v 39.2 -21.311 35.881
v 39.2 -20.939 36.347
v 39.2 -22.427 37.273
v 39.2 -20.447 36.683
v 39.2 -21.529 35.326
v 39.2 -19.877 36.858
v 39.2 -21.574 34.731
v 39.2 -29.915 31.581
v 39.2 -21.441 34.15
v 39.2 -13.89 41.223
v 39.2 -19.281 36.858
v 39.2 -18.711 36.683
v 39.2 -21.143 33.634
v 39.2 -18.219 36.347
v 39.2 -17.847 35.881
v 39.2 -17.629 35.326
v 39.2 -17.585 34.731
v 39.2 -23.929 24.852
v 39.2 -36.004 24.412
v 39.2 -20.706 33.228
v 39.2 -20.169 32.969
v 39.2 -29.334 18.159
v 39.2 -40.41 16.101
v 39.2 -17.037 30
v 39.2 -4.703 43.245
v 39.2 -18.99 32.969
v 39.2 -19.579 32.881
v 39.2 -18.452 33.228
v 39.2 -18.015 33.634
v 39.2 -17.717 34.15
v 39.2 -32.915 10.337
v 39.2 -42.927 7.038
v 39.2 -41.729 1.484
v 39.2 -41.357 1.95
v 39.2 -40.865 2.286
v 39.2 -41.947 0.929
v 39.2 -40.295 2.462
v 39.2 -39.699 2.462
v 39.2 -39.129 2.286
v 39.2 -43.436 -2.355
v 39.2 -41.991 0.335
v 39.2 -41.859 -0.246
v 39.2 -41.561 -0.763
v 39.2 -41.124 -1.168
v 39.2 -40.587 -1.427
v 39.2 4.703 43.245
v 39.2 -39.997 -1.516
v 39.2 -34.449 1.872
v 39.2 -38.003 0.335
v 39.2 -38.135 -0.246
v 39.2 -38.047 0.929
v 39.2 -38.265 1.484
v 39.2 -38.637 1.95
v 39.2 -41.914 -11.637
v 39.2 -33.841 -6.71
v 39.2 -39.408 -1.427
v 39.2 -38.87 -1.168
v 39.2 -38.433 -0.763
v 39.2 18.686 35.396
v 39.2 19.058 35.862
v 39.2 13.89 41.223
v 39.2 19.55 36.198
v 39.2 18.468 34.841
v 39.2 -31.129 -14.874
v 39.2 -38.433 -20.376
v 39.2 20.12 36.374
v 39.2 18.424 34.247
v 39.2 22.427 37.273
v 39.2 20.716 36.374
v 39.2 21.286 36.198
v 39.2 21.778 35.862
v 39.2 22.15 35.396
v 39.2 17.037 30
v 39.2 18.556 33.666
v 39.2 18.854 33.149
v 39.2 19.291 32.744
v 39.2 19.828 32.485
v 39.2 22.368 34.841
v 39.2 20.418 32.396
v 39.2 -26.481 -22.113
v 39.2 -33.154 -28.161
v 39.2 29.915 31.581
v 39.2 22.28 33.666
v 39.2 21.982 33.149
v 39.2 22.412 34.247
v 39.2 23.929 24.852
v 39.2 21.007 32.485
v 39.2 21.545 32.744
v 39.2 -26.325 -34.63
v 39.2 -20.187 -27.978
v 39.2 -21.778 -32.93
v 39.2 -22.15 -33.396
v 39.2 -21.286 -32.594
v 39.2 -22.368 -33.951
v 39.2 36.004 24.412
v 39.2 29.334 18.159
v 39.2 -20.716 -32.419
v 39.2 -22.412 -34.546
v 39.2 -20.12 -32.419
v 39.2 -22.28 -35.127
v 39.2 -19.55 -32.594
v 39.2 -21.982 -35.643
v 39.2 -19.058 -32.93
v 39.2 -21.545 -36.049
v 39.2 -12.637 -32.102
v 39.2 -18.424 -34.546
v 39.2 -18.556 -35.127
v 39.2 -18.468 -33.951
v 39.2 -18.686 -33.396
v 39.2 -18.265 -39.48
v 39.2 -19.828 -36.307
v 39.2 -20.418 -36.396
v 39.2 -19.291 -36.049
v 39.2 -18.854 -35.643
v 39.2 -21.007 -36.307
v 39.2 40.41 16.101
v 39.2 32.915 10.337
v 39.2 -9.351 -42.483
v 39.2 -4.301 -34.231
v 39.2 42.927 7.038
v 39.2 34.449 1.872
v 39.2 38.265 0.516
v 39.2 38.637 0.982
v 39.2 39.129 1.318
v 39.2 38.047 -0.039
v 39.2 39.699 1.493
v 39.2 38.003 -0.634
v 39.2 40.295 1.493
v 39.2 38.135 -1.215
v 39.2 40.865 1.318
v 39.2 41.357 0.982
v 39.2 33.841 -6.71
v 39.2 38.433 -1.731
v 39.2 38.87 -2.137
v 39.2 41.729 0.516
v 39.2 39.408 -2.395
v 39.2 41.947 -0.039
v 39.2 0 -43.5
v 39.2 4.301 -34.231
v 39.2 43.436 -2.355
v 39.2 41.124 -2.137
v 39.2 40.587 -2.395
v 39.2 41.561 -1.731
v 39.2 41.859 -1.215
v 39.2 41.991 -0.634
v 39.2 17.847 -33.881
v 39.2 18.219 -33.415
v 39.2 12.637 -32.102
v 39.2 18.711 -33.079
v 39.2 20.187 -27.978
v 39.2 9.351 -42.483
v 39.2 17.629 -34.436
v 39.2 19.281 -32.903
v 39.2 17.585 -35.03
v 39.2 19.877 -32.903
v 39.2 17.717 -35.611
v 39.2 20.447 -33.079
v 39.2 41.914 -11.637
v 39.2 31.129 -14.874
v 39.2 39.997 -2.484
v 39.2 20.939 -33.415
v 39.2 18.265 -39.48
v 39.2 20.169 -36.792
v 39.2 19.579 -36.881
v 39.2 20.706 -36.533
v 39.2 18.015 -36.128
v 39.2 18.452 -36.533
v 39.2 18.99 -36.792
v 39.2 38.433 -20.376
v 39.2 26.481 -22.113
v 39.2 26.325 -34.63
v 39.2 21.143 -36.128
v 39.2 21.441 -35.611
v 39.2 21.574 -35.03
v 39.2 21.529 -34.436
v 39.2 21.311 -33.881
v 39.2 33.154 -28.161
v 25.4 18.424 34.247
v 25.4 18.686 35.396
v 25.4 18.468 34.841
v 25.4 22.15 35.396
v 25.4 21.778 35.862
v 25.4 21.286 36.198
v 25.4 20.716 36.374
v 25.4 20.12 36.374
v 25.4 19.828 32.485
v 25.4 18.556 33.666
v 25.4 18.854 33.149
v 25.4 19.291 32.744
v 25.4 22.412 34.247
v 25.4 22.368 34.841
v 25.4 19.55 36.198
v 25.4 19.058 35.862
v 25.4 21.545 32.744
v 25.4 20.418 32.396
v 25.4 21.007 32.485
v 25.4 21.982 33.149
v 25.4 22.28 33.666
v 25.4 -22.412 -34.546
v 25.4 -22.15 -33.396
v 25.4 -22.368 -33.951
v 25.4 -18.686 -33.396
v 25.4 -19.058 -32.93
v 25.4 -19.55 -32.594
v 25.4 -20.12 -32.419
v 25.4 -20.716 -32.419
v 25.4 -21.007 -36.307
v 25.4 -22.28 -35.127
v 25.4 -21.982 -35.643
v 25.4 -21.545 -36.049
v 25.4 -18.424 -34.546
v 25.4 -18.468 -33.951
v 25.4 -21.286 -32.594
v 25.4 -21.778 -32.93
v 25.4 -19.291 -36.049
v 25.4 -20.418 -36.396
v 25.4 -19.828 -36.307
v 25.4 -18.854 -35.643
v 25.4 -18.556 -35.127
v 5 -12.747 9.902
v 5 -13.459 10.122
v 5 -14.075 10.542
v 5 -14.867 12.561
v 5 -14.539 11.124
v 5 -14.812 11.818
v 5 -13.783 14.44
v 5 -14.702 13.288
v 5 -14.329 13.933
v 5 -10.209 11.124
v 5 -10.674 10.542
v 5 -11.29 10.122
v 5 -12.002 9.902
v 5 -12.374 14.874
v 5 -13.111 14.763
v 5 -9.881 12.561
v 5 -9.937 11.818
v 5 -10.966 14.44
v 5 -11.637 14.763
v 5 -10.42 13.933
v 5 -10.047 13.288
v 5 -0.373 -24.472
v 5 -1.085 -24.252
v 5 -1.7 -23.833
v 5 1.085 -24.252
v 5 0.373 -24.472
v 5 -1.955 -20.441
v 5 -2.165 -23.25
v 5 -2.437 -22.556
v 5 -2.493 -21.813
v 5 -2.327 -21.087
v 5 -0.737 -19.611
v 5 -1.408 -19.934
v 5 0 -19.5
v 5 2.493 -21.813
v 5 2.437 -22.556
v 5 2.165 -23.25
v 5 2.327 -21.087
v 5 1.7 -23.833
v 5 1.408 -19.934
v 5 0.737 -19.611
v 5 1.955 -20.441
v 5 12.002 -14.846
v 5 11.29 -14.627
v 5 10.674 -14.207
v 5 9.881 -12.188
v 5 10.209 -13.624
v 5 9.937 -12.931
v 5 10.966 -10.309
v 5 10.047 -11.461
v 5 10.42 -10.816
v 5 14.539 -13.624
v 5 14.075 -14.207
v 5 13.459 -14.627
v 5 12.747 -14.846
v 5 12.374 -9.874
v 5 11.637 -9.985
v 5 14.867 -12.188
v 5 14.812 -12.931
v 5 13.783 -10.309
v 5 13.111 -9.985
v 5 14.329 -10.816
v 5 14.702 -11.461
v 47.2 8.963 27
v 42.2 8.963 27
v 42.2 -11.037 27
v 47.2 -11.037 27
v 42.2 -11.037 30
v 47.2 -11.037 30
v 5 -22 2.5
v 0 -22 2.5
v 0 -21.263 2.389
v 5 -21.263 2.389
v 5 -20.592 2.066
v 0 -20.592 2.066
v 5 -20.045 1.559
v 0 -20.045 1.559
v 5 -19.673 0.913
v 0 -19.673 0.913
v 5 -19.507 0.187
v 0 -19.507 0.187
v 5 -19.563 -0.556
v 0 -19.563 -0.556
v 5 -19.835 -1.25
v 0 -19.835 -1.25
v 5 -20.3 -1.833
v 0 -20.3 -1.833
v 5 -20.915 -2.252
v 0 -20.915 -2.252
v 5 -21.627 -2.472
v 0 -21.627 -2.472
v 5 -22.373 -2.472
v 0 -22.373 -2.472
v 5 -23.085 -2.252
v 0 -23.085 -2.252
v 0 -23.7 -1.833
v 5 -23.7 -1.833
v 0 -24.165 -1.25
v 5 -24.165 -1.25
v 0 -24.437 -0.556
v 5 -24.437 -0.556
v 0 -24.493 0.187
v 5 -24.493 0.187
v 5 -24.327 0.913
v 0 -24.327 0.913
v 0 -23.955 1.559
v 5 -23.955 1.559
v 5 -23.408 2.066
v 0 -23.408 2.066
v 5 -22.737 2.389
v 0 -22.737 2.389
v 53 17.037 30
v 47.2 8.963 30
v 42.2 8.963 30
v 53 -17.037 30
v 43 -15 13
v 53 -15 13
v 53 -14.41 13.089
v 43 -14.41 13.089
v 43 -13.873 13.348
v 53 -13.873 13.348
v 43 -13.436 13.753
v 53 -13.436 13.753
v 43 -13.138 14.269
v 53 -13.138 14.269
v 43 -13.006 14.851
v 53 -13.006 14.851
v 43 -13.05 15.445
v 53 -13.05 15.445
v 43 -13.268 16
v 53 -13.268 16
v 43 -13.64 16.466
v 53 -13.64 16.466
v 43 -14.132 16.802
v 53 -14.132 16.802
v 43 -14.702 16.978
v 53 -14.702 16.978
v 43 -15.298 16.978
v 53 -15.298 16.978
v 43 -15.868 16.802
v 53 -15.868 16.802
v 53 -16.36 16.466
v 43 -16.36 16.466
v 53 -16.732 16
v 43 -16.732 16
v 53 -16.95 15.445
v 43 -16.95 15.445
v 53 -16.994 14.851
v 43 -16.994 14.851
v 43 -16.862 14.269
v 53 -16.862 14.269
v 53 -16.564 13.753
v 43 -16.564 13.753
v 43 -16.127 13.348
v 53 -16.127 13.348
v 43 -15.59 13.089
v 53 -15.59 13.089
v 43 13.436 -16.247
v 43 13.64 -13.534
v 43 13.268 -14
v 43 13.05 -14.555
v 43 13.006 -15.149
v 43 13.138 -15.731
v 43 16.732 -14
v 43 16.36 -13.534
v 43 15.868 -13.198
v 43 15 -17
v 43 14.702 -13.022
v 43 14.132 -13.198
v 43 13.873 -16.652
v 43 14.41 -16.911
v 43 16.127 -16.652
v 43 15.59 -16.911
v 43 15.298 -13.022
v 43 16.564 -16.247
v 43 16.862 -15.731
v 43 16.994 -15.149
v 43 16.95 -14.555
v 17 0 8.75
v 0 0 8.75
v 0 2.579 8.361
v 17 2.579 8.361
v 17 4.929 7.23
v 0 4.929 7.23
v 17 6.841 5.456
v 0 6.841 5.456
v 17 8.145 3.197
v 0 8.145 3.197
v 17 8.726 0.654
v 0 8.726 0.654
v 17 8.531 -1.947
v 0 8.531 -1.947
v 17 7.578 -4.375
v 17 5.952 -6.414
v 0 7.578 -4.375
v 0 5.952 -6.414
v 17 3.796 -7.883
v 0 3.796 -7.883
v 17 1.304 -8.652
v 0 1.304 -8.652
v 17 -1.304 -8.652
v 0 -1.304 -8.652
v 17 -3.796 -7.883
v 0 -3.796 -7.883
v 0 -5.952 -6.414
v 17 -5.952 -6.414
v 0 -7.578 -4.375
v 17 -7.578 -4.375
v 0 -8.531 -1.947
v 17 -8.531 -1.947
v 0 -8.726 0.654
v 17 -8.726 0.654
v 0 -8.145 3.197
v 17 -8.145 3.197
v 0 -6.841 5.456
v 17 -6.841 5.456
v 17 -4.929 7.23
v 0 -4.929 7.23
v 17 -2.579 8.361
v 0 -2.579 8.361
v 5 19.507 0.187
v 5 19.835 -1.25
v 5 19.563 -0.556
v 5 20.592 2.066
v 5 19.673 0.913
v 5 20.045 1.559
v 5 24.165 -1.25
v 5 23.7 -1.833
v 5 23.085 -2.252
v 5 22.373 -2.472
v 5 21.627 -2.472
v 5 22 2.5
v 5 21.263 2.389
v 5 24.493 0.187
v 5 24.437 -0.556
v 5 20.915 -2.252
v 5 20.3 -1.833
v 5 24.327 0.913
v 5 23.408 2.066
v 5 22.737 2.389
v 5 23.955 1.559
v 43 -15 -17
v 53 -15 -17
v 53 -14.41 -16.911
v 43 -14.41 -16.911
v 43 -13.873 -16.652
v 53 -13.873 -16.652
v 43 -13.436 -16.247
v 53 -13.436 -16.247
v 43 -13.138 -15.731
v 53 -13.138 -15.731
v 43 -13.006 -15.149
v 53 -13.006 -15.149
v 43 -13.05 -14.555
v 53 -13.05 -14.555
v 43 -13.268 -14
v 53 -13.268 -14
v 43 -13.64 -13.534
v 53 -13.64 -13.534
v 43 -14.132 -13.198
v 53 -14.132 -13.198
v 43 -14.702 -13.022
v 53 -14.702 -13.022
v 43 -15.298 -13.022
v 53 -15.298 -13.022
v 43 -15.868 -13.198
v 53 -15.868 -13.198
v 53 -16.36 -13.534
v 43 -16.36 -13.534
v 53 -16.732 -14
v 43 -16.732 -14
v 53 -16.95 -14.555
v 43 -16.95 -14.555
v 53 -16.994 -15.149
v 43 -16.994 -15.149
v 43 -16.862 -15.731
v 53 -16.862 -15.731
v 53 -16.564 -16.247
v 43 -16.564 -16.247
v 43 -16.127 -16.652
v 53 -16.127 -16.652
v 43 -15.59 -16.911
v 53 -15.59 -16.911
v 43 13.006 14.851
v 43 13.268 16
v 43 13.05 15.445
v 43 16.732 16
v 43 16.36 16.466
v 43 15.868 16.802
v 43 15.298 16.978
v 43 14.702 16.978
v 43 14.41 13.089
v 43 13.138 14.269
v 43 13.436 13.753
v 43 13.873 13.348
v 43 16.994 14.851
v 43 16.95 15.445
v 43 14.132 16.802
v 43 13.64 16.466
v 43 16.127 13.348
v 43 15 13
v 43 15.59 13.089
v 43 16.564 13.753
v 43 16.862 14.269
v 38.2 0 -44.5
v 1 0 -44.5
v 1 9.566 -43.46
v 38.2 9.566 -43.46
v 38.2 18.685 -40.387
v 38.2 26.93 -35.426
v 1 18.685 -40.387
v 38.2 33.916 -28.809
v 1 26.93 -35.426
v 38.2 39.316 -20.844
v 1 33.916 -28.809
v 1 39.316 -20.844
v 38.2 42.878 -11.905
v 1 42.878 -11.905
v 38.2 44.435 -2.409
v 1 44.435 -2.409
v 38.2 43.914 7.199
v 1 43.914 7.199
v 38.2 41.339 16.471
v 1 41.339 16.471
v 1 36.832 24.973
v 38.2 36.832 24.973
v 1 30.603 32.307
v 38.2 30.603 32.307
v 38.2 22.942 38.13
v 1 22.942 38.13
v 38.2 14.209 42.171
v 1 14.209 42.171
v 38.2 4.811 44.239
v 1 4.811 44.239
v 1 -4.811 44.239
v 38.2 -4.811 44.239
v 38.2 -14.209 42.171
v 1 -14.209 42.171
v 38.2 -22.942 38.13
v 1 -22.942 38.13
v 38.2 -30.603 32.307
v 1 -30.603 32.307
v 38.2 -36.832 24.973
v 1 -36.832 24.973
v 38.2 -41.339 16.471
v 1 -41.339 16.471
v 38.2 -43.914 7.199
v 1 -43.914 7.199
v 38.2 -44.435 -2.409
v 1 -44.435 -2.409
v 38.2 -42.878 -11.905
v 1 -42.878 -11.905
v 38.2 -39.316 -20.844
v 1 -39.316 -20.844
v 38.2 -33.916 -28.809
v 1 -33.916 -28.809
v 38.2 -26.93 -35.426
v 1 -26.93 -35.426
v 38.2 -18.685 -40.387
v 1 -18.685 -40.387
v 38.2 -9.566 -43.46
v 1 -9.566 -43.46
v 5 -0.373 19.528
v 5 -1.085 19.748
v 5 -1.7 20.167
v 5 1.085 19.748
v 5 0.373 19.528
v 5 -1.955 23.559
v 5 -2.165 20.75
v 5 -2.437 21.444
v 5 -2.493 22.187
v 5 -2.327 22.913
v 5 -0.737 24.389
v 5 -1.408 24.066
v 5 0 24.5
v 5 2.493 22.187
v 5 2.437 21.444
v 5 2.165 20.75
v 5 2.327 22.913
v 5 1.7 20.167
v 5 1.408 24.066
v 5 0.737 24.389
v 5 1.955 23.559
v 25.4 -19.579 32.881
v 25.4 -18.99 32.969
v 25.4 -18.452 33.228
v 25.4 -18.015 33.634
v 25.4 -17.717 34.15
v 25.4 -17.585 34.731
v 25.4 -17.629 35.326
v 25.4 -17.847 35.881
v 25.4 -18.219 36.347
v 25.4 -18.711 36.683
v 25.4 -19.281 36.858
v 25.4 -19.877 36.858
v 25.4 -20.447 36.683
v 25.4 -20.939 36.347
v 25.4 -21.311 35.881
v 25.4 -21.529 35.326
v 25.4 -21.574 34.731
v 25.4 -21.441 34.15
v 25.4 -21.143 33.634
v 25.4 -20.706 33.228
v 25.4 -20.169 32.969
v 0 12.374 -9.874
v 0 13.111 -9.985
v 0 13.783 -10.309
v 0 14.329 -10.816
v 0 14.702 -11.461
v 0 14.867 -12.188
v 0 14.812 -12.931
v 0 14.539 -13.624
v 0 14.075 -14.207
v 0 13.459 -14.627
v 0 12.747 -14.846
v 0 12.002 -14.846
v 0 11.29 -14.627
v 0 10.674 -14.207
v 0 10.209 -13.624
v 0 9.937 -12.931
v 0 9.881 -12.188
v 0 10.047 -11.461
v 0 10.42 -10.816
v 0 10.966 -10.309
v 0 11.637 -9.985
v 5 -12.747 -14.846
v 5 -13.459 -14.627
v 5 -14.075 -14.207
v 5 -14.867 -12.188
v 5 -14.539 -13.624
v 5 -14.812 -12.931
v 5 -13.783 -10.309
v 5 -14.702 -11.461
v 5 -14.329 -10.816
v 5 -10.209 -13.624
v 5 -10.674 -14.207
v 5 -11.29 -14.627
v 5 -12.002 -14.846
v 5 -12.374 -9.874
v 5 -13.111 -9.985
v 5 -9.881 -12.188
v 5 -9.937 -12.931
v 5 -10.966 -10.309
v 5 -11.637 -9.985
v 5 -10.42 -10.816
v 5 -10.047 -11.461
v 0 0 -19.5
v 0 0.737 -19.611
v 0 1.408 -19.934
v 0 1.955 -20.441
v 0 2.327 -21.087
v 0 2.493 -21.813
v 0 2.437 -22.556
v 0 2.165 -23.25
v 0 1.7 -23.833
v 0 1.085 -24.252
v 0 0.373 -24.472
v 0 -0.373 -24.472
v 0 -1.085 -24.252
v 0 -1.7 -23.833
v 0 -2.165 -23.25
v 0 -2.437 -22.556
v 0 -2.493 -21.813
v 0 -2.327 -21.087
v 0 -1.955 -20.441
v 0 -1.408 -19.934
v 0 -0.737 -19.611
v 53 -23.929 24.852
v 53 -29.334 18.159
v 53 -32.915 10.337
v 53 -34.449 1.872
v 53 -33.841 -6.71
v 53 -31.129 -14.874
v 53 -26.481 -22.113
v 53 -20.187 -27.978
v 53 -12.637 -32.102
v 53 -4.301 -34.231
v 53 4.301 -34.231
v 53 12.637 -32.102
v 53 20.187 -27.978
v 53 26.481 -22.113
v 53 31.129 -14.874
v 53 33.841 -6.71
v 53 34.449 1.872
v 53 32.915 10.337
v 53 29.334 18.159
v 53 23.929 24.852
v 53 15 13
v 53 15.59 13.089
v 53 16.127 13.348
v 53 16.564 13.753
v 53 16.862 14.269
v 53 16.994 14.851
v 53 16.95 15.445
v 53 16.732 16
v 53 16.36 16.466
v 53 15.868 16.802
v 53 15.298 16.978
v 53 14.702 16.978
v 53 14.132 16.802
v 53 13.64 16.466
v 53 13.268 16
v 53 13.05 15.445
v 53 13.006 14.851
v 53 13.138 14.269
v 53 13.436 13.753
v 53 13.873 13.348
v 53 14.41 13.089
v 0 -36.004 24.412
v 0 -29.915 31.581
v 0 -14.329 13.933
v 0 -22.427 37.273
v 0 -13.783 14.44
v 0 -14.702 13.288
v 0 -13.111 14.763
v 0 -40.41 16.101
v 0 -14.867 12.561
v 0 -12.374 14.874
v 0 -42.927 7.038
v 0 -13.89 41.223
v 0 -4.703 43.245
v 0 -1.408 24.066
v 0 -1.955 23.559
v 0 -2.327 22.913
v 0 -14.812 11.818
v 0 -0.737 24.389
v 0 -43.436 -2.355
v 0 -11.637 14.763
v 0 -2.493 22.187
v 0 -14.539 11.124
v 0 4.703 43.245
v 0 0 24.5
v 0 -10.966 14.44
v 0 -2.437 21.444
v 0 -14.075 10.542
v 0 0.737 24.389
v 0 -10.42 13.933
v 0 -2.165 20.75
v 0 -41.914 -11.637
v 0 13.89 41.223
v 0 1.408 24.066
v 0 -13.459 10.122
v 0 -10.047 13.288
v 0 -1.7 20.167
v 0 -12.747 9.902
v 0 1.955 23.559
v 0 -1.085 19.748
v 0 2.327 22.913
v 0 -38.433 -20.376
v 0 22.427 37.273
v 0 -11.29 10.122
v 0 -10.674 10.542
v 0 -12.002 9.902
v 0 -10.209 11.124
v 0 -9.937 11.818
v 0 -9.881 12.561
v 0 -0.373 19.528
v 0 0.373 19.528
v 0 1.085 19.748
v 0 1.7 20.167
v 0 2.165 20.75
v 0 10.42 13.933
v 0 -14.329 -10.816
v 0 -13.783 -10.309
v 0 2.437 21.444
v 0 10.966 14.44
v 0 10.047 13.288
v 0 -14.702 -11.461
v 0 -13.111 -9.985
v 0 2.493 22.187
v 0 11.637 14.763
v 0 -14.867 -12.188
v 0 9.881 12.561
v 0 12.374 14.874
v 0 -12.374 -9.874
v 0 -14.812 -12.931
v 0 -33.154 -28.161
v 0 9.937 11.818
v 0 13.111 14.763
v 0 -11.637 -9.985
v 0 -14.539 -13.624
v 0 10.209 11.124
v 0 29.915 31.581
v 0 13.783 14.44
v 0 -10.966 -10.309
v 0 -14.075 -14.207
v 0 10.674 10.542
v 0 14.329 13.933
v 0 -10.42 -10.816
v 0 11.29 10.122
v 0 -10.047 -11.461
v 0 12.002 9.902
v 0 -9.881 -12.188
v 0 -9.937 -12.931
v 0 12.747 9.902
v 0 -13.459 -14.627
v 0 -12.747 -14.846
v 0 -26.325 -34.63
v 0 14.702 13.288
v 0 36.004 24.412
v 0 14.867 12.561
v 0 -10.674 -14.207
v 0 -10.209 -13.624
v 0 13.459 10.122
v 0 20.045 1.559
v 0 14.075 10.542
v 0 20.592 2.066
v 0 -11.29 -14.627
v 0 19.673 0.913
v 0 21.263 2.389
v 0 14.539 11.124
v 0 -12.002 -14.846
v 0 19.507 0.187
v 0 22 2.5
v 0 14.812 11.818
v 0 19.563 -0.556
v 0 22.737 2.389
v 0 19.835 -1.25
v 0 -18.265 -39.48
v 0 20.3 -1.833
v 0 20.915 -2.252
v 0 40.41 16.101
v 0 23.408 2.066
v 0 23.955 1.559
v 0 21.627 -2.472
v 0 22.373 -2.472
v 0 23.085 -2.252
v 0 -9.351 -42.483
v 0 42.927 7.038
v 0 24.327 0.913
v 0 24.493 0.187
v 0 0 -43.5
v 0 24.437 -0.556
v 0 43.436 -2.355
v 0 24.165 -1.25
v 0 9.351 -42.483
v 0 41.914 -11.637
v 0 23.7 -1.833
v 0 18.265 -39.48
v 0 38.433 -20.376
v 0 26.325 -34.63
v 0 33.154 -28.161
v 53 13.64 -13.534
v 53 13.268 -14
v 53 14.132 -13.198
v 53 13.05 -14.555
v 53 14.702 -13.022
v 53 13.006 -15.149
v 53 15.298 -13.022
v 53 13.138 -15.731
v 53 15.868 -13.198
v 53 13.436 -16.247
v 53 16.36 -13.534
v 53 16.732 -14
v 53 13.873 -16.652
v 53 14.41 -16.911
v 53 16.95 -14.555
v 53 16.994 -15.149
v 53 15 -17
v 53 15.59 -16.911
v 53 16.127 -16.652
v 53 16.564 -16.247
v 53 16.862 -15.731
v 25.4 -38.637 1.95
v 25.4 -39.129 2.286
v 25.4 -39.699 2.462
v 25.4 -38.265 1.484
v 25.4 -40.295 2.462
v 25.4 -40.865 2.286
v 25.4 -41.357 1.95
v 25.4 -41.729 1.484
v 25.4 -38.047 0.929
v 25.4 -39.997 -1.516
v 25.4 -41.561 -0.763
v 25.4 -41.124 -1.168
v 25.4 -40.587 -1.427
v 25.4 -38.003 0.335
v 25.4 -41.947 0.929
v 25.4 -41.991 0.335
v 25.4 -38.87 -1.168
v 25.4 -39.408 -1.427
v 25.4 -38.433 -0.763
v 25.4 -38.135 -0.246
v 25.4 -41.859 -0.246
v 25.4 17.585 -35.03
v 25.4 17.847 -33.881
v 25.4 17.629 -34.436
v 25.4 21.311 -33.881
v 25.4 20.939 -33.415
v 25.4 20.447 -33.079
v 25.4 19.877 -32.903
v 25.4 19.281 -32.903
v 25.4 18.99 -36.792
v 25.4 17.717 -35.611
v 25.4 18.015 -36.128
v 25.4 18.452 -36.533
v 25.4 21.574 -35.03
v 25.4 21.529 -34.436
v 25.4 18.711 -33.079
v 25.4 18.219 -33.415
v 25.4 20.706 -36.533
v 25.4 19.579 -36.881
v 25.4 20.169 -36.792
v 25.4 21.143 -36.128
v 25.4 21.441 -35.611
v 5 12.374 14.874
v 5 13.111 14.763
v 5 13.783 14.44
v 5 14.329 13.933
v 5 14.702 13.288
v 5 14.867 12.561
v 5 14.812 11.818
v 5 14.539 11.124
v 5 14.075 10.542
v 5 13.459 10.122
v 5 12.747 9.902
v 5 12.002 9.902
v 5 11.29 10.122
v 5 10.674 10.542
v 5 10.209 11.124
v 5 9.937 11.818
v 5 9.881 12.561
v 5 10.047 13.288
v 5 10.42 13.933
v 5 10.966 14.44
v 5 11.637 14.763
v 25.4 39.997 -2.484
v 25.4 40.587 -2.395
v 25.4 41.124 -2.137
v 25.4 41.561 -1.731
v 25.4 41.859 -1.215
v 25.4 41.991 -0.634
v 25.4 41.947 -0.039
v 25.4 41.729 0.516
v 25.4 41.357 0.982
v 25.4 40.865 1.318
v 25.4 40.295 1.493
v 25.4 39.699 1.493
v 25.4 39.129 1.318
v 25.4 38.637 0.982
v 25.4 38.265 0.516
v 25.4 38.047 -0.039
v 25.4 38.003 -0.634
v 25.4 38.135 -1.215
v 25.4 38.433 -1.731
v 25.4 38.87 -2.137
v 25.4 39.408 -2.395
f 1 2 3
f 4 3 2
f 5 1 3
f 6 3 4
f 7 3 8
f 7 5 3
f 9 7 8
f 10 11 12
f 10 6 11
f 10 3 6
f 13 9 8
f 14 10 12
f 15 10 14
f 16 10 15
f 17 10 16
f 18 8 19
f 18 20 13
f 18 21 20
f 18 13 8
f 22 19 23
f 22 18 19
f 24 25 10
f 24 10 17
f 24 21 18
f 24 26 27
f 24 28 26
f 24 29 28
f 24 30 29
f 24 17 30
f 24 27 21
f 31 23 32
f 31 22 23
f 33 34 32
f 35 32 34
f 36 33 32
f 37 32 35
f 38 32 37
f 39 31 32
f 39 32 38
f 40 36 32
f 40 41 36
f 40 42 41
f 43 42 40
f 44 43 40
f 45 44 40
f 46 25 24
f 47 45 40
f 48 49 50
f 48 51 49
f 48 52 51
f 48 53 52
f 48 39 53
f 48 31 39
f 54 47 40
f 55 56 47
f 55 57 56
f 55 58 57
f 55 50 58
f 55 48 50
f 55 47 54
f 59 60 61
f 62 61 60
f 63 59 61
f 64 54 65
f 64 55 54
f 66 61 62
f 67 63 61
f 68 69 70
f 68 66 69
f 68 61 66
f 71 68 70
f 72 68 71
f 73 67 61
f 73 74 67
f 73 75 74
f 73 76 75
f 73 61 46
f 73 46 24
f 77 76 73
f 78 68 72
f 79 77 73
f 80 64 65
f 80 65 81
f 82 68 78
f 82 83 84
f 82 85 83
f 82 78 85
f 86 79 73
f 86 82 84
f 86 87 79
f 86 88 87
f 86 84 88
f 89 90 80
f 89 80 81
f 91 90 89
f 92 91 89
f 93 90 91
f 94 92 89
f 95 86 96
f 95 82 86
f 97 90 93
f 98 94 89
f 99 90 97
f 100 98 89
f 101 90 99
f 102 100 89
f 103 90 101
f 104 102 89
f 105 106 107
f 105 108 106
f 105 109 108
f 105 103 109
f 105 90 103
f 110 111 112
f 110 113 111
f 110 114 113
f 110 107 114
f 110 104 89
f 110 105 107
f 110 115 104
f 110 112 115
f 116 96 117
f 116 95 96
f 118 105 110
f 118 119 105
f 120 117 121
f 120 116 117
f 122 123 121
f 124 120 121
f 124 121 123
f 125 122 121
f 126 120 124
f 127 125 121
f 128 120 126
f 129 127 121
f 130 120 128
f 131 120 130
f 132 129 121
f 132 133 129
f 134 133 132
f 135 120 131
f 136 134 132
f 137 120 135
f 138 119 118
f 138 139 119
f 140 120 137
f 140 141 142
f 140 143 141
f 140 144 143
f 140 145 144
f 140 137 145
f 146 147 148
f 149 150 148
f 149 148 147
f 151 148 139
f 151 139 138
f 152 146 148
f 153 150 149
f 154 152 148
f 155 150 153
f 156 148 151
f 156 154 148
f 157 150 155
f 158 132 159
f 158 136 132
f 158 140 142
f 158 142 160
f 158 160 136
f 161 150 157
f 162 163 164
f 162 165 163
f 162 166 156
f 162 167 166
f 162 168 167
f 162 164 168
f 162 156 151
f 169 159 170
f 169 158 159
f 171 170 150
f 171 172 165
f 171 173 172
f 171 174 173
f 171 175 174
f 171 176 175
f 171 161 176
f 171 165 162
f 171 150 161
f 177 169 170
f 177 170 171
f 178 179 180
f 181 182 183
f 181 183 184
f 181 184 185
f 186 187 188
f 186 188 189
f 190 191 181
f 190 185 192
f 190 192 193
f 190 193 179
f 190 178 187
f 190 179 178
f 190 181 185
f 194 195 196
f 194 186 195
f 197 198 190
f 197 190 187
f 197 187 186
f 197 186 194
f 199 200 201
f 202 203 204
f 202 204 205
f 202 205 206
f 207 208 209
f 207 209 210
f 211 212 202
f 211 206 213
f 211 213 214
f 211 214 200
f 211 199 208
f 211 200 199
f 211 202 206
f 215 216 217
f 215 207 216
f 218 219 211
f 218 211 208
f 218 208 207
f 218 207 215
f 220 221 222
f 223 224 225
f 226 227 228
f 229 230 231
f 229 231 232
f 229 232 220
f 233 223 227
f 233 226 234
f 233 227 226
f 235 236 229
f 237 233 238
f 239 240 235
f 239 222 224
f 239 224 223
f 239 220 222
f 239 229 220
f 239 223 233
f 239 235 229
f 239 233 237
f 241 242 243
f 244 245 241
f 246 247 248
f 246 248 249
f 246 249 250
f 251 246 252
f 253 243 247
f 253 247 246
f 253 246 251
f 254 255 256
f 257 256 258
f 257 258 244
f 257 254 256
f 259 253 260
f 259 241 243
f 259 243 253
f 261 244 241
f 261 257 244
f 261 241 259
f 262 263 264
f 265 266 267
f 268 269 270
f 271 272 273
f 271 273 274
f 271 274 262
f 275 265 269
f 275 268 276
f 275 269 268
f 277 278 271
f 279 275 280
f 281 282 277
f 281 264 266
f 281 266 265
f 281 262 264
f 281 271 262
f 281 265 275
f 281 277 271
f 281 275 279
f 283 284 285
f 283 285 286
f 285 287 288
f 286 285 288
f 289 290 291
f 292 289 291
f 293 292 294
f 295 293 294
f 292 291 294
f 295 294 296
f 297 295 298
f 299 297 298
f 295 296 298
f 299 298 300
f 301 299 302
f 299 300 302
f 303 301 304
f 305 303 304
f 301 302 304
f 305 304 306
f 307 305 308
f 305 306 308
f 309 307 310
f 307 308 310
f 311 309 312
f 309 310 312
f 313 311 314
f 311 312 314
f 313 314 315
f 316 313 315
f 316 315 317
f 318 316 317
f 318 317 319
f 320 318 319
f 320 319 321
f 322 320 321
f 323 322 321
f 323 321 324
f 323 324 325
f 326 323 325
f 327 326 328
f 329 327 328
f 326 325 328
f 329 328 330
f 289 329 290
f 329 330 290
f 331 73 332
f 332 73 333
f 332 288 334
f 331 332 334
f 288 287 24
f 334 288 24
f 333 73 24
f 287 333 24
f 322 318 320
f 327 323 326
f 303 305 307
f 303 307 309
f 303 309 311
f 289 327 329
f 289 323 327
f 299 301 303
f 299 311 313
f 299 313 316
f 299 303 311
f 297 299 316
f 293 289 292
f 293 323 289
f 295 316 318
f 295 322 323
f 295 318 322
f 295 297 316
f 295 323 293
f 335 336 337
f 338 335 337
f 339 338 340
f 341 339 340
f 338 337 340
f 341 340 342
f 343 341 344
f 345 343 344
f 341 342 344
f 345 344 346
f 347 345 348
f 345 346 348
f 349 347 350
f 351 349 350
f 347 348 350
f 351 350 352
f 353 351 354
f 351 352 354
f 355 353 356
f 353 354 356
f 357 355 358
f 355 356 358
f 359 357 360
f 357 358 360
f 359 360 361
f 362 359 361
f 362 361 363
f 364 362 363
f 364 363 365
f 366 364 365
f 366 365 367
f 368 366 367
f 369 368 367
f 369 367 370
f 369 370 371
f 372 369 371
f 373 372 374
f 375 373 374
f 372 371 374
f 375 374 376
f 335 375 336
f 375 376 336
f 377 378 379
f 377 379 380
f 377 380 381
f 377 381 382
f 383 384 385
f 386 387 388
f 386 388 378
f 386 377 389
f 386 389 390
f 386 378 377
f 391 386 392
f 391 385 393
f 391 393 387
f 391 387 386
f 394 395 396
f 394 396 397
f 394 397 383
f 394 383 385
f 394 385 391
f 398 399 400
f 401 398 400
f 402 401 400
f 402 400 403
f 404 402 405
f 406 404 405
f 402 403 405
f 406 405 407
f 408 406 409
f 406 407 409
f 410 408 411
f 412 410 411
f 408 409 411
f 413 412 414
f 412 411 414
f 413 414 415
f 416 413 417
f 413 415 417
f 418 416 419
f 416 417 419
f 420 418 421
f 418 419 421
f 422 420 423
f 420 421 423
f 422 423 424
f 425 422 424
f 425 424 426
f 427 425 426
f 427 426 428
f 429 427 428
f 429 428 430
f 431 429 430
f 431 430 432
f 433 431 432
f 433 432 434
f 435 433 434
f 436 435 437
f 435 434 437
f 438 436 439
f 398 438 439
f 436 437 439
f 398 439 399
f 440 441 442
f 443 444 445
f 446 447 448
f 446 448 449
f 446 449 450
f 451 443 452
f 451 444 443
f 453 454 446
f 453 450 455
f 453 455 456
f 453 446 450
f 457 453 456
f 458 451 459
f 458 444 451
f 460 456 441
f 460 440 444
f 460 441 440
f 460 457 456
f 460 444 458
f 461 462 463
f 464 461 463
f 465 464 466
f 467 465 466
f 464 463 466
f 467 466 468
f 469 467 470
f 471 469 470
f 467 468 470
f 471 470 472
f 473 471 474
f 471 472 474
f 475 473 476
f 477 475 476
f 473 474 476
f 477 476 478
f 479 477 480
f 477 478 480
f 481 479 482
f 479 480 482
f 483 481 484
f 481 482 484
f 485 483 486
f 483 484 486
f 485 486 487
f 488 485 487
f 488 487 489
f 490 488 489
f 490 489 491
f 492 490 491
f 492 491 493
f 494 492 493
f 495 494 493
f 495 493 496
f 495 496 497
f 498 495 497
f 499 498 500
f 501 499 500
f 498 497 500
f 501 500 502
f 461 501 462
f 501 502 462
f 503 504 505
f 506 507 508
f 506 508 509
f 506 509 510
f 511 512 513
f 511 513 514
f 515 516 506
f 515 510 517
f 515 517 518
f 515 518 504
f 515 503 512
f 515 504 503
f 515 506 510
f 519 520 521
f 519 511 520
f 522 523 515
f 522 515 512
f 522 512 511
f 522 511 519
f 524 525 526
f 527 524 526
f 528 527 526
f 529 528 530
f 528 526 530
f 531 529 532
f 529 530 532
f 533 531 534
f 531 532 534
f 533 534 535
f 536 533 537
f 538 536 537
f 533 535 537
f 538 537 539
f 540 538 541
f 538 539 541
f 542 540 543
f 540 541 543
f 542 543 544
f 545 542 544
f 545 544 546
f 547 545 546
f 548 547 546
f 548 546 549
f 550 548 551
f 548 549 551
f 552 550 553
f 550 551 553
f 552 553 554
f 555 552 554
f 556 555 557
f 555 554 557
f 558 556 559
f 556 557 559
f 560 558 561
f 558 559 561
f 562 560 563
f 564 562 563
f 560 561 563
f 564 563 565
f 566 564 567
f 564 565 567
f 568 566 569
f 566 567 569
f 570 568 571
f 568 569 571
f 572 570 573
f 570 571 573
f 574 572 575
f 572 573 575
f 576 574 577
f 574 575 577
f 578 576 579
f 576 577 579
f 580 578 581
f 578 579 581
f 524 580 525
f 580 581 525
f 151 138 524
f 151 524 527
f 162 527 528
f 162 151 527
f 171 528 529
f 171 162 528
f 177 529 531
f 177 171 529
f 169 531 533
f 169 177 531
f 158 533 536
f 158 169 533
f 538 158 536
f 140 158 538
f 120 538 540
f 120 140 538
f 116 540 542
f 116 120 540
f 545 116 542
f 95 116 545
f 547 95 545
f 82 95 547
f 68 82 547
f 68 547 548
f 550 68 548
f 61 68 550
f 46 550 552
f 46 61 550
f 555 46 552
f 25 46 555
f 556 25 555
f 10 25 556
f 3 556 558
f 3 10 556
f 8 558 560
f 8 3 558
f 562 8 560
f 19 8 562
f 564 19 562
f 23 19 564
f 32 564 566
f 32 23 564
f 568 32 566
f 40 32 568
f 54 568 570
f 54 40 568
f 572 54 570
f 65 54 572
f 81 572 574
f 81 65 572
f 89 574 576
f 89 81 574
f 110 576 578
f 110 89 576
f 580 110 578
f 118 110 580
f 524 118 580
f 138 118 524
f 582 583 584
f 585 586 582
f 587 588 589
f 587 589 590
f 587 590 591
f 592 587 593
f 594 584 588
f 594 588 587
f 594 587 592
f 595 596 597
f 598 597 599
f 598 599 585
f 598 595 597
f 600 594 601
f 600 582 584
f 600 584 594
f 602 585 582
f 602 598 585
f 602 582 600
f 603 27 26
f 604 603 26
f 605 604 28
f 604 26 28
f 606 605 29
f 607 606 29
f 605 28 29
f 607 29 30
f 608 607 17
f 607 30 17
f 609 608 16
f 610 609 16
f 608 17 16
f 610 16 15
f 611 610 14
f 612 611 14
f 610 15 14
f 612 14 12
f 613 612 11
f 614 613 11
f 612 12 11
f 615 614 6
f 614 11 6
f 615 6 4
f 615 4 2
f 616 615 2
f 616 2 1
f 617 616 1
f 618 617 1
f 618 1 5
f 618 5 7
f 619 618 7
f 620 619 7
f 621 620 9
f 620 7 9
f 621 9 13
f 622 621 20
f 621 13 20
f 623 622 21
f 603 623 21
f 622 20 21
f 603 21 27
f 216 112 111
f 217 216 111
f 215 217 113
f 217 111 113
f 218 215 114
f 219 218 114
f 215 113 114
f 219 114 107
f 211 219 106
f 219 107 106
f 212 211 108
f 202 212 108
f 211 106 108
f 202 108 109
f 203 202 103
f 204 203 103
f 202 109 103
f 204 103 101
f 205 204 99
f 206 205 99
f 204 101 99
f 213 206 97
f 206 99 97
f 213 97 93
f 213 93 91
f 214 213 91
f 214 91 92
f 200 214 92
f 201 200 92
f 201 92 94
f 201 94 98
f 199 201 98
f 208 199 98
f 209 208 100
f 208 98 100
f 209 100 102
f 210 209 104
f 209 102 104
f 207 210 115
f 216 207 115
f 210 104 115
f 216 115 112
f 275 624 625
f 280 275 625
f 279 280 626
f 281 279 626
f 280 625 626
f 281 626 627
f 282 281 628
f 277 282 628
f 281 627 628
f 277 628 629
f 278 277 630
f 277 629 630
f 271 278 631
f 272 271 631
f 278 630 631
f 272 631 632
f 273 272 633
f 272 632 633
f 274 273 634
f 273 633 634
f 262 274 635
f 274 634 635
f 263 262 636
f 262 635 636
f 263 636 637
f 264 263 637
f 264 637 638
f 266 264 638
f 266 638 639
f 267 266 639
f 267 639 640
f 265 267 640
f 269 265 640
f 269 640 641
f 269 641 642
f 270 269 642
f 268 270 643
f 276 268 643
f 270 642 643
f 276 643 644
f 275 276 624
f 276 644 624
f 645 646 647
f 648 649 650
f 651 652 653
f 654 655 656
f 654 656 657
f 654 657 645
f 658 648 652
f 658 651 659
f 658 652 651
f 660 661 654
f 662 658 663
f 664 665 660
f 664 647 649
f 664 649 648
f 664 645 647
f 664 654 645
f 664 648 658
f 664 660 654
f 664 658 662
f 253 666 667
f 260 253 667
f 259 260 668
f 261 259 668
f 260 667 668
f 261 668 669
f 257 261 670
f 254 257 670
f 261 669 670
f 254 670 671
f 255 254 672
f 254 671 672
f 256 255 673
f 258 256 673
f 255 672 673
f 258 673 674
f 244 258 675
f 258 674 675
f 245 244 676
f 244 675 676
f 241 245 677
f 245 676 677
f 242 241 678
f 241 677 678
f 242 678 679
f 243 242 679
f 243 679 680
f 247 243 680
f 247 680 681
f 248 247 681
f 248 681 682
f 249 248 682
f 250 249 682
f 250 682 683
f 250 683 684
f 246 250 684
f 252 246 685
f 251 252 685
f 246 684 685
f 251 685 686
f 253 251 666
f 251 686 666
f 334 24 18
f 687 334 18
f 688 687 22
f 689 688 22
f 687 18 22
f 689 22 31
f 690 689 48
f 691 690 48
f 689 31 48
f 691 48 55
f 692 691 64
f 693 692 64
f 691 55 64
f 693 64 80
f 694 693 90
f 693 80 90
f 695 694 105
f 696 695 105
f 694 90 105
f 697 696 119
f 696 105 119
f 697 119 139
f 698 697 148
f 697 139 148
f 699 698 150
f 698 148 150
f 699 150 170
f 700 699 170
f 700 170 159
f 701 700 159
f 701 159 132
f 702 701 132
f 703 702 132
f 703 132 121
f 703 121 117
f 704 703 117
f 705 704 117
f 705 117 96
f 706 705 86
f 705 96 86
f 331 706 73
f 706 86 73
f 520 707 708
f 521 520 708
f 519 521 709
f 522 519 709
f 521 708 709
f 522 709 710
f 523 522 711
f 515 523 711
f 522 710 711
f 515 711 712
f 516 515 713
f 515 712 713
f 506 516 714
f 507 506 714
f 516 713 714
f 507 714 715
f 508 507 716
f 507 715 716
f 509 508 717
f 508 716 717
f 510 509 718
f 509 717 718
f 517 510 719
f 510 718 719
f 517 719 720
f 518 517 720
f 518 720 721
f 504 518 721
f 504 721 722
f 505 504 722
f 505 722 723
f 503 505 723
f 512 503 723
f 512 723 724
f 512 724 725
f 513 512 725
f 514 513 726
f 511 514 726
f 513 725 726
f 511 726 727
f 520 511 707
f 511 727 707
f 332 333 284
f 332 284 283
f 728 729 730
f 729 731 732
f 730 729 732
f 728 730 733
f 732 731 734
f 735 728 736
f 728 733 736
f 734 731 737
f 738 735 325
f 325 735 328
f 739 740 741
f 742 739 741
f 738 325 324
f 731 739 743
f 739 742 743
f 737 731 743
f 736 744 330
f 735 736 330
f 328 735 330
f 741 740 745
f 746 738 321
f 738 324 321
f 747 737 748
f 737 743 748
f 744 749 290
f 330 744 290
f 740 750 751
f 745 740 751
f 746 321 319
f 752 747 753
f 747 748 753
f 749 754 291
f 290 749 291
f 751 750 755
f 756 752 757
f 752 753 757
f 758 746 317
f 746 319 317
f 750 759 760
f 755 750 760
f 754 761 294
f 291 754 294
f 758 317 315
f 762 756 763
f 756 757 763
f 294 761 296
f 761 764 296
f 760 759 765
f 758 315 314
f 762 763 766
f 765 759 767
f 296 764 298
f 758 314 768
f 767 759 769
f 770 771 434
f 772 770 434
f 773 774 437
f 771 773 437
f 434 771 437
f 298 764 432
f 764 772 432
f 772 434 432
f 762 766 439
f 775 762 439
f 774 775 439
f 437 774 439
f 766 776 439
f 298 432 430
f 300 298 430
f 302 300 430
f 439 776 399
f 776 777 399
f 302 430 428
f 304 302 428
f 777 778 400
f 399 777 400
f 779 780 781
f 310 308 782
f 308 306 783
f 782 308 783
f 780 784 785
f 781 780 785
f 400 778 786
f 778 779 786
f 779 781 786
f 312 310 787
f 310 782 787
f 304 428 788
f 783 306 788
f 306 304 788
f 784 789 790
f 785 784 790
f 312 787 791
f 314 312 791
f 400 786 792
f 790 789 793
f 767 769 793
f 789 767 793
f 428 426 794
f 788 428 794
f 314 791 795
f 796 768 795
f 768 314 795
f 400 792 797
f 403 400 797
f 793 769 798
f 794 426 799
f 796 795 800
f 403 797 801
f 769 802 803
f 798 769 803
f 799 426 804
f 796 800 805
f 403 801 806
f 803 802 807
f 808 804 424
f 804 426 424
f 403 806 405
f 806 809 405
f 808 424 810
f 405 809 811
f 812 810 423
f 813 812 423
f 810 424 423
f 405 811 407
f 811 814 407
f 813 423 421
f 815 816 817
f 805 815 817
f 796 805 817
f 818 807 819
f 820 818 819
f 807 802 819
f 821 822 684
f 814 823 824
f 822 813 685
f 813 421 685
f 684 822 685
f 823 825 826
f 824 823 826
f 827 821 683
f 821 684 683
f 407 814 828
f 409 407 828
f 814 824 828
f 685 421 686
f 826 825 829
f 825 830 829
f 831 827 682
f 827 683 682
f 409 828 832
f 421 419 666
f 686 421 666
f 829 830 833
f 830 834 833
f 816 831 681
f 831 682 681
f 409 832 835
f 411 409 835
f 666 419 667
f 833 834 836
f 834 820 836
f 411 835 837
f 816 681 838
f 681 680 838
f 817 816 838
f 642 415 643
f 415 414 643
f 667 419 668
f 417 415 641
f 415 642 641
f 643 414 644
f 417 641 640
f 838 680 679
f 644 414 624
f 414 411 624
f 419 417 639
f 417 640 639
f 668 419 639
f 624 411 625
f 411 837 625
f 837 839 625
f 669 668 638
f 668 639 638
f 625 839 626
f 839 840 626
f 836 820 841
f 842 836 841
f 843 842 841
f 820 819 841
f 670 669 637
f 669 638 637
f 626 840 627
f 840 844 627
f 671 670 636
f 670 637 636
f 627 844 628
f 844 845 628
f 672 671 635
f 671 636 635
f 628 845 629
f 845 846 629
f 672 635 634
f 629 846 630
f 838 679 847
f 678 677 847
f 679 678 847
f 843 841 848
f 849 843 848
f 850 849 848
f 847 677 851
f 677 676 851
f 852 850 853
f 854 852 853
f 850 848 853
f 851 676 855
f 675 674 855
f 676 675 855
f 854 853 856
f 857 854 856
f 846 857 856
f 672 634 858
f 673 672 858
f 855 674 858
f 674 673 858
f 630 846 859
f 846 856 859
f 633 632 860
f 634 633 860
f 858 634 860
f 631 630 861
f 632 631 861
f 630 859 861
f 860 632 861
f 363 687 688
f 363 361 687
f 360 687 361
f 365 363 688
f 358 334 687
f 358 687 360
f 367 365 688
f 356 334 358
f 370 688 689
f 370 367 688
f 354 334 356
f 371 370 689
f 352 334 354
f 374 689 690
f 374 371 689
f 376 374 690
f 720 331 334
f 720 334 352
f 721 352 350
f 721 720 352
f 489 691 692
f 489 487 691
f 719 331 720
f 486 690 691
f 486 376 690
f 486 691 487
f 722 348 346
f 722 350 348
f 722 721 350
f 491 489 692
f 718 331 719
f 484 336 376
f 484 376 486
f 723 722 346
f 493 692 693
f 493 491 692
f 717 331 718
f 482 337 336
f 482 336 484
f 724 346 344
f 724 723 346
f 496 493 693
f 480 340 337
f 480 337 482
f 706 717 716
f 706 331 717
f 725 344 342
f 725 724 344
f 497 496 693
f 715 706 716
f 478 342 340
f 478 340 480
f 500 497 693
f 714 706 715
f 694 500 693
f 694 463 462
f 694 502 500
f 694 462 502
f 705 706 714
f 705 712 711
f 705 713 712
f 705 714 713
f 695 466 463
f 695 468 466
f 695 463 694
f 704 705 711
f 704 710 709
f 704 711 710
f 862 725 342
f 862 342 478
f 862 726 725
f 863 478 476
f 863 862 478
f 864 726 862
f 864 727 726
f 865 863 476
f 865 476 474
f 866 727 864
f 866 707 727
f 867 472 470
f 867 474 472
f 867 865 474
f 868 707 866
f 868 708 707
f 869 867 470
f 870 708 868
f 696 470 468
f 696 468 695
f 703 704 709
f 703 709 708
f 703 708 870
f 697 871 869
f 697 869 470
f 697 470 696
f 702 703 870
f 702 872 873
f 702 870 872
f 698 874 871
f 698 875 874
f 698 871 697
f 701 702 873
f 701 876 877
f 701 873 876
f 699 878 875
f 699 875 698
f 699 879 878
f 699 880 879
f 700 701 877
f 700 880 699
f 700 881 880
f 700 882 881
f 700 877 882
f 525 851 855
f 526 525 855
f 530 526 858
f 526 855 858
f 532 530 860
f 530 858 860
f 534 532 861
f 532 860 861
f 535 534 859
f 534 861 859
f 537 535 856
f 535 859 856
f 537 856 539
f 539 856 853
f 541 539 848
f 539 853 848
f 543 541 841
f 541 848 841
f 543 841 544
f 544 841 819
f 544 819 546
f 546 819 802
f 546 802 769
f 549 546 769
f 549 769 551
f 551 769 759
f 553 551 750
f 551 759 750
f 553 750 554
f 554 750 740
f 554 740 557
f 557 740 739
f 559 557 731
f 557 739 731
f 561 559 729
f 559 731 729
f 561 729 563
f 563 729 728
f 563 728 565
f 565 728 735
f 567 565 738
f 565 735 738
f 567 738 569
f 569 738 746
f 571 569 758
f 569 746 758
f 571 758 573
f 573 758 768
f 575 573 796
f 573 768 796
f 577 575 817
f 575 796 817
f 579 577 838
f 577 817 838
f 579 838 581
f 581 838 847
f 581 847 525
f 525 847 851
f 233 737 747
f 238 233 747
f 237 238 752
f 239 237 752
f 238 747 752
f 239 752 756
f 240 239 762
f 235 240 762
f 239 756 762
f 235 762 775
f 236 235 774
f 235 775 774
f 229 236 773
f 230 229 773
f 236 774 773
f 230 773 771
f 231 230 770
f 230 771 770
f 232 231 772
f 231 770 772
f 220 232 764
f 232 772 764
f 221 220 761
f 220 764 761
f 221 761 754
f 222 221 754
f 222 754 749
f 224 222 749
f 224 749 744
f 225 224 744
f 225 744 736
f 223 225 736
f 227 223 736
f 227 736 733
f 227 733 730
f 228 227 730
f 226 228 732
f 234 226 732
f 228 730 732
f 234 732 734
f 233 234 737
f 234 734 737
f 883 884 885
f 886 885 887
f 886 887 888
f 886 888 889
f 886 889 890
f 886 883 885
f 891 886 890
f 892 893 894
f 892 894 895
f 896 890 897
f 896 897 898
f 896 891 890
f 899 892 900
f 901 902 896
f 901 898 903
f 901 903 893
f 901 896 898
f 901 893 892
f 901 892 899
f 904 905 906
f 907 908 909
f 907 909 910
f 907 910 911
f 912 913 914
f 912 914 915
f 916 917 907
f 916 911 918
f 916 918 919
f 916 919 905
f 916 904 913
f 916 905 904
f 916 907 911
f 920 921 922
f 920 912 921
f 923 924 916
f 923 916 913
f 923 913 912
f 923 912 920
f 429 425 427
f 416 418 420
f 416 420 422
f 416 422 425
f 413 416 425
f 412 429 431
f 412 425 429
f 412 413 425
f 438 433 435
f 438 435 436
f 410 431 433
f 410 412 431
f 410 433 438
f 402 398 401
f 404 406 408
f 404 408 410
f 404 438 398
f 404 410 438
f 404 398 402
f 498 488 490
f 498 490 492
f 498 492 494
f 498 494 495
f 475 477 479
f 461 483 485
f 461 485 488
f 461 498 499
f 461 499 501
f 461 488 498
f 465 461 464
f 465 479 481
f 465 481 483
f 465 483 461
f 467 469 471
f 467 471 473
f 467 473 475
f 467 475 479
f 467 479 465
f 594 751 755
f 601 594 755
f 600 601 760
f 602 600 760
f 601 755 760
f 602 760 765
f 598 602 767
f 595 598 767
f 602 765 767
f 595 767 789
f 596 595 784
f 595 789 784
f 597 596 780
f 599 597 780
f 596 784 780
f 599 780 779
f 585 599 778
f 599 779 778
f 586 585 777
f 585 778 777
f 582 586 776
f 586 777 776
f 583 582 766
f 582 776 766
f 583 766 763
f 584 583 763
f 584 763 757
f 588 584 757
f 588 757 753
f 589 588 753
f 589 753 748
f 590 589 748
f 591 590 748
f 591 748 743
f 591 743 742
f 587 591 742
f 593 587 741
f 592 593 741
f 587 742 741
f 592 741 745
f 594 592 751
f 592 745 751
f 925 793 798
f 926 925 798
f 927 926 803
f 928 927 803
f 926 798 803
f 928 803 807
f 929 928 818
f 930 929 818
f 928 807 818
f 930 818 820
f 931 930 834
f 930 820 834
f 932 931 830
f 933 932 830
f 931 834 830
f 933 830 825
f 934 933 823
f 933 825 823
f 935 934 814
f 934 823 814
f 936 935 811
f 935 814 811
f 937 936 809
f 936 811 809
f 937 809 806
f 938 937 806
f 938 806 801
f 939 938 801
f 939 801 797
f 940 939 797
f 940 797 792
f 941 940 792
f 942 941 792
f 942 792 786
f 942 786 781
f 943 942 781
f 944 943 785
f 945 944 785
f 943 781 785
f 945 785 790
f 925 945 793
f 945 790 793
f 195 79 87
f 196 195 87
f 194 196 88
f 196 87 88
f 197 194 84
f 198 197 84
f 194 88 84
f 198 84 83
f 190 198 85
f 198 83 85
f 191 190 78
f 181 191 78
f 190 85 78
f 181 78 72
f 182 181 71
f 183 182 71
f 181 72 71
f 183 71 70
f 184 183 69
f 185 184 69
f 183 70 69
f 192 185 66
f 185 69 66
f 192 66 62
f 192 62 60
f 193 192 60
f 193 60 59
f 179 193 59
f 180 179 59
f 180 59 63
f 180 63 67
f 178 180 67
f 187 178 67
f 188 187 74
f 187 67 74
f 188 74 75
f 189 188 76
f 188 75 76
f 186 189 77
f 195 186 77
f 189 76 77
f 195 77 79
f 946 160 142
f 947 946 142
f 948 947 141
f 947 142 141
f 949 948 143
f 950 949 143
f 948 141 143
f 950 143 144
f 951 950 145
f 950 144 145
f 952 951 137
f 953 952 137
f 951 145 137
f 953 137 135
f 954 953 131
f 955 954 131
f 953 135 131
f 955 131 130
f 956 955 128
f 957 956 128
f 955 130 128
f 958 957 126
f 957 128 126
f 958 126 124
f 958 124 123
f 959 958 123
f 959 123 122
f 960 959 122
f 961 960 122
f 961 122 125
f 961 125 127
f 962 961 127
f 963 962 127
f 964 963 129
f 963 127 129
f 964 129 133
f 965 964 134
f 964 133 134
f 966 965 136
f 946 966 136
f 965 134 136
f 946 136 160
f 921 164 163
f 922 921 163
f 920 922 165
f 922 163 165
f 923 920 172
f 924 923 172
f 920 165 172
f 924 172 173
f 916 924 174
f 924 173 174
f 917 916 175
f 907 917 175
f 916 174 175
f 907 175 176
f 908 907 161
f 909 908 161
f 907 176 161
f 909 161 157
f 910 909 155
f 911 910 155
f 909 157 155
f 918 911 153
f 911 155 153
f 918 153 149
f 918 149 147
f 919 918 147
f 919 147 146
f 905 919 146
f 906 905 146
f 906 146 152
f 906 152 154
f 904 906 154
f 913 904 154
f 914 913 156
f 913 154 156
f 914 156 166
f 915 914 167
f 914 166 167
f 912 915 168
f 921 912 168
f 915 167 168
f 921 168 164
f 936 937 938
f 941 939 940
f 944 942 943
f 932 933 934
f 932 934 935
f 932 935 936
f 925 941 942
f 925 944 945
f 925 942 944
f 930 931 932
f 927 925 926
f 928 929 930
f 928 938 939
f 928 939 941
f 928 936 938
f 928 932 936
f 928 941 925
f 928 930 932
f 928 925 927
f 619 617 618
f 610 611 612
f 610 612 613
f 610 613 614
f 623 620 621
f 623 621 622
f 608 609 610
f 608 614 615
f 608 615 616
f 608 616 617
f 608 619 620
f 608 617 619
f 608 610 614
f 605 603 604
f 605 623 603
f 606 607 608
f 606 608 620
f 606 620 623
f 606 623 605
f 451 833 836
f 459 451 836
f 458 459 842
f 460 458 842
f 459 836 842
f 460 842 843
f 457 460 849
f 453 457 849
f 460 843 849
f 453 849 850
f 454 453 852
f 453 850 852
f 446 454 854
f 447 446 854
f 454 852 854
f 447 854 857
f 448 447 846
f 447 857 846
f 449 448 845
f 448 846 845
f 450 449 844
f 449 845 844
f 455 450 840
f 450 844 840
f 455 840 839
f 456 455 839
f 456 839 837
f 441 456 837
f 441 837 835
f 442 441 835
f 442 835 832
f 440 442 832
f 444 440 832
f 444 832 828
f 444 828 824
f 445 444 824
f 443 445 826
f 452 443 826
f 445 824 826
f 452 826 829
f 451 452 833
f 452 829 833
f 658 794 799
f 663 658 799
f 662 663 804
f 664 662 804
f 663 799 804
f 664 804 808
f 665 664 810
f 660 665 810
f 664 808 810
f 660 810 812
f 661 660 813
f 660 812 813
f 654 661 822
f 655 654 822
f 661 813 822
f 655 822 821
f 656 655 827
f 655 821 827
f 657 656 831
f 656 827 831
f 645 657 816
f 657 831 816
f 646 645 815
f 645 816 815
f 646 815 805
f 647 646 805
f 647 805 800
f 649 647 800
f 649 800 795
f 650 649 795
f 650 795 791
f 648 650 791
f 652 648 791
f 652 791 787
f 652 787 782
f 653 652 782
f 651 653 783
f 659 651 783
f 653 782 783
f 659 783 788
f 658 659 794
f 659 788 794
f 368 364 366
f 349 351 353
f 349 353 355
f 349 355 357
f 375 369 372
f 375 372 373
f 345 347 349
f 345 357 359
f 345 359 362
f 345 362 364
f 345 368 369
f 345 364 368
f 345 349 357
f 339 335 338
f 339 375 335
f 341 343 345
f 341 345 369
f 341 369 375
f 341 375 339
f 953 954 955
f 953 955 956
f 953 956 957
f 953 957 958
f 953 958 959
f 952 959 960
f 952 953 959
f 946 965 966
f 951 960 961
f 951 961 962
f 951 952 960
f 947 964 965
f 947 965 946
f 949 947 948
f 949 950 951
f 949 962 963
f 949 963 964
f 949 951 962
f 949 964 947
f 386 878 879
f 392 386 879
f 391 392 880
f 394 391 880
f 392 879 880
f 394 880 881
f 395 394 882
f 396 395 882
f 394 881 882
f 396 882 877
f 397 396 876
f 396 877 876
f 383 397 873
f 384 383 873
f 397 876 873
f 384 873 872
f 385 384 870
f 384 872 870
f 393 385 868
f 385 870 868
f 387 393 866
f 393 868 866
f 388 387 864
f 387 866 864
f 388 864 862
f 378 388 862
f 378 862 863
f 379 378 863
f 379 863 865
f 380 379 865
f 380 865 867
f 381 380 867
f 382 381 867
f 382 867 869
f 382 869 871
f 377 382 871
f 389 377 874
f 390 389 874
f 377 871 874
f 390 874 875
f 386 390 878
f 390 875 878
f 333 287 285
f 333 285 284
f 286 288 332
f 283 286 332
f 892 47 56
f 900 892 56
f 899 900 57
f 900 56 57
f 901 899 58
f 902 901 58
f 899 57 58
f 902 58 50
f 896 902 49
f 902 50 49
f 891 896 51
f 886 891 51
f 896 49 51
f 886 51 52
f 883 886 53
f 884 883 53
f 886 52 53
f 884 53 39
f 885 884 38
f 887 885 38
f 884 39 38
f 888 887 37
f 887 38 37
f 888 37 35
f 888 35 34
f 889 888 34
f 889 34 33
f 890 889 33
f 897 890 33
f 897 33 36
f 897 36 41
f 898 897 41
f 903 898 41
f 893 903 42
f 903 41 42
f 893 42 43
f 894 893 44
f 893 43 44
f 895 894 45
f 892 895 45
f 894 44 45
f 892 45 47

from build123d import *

# Parameters (mm, degrees)
SKETCH_1_R          = 44.5
EXTRUDE_1_DEPTH     = 39.2
EXTRUDE_3_DEPTH     = 13.8
SKETCH_4_R          = 2
CUT_EXTRUDE_1_DEPTH = 13.8
SKETCH_5_R          = 2
CUT_EXTRUDE_2_DEPTH = 10
CHAMFER_1_SIZE      = 1
SKETCH_6_R          = 2.5
CUT_EXTRUDE_3_DEPTH = 5
SKETCH_7_W          = 5
SKETCH_7_H          = 20
CUT_EXTRUDE_4_DEPTH = 3
SKETCH_8_R          = 8.75
CUT_EXTRUDE_5_DEPTH = 17


with BuildPart() as part:
    # 草图1 → 凸台-拉伸1 (new body)
    with BuildSketch(Plane(origin=(0, 0, 0), x_dir=(0, 0, -1), z_dir=(1, 0, 0))):
        Circle(SKETCH_1_R)
    extrude(amount=EXTRUDE_1_DEPTH)

    # 草图2 → 凸台-拉伸3 (add)
    with BuildSketch(Plane(origin=(39.2, 0, 0), x_dir=(0, 0, -1), z_dir=(1, 0, 0))):
        with BuildLine():
            Line((-30, 17.036725037), (-30, -17.036725037))
            ThreePointArc((-30, -17.036725037), (34.5, 0), (-30, 17.036725037))
        make_face()
    extrude(amount=EXTRUDE_3_DEPTH)

    # 草图4 → 切除-拉伸1 (cut)
    with BuildSketch(Plane(origin=(39.2, 0, 0), x_dir=(0, 0, -1), z_dir=(1, 0, 0))):
        with Locations((0.484323727, 39.997067774)):
            Circle(SKETCH_4_R)
        with Locations((34.880638633, 19.579097236)):
            Circle(SKETCH_4_R)
        with Locations((34.396314906, -20.417970538)):
            Circle(SKETCH_4_R)
        with Locations((-0.484323727, -39.997067774)):
            Circle(SKETCH_4_R)
        with Locations((-34.880638633, -19.579097236)):
            Circle(SKETCH_4_R)
        with Locations((-34.396314906, 20.417970538)):
            Circle(SKETCH_4_R)
    extrude(amount=-CUT_EXTRUDE_1_DEPTH, mode=Mode.SUBTRACT)

    # 草图5 → 切除-拉伸2 (cut)
    with BuildSketch(Plane(origin=(53, 0, 0), x_dir=(0, 0, -1), z_dir=(1, 0, 0))):
        with Locations((-15, 15)):
            Circle(SKETCH_5_R)
        with Locations((15, 15)):
            Circle(SKETCH_5_R)
        with Locations((15, -15)):
            Circle(SKETCH_5_R)
        with Locations((-15, -15)):
            Circle(SKETCH_5_R)
    extrude(amount=-CUT_EXTRUDE_2_DEPTH, mode=Mode.SUBTRACT)

    # 倒角1
    chamfer_1_edges = [part.edges().sort_by_distance(p)[0] for p in [
        (0, 0, 44.5),
        (39.2, 0, 44.5),
    ]]
    chamfer(chamfer_1_edges, length=CHAMFER_1_SIZE)

    # 草图6 → 切除-拉伸3 (cut)
    with BuildSketch(Plane.ZY):
        with Locations((0, 22)):
            Circle(SKETCH_6_R)
        with Locations((-12.374368671, 12.374368671)):
            Circle(SKETCH_6_R)
        with Locations((22, 0)):
            Circle(SKETCH_6_R)
        with Locations((12.374368671, 12.374368671)):
            Circle(SKETCH_6_R)
        with Locations((0, -22)):
            Circle(SKETCH_6_R)
        with Locations((12.374368671, -12.374368671)):
            Circle(SKETCH_6_R)
        with Locations((-22, 0)):
            Circle(SKETCH_6_R)
        with Locations((-12.374368671, -12.374368671)):
            Circle(SKETCH_6_R)
    extrude(amount=-CUT_EXTRUDE_3_DEPTH, mode=Mode.SUBTRACT)

    # 草图7 → 切除-拉伸4 (cut)
    with BuildSketch(Plane.XY.offset(30)):
        with Locations((44.7, -1.036725037)):
            Rectangle(SKETCH_7_W, SKETCH_7_H)
    extrude(amount=-CUT_EXTRUDE_4_DEPTH, mode=Mode.SUBTRACT)

    # 草图8 → 切除-拉伸5 (cut)
    with BuildSketch(Plane.ZY):
        Circle(SKETCH_8_R)
    extrude(amount=-CUT_EXTRUDE_5_DEPTH, mode=Mode.SUBTRACT)


solid = part.part
